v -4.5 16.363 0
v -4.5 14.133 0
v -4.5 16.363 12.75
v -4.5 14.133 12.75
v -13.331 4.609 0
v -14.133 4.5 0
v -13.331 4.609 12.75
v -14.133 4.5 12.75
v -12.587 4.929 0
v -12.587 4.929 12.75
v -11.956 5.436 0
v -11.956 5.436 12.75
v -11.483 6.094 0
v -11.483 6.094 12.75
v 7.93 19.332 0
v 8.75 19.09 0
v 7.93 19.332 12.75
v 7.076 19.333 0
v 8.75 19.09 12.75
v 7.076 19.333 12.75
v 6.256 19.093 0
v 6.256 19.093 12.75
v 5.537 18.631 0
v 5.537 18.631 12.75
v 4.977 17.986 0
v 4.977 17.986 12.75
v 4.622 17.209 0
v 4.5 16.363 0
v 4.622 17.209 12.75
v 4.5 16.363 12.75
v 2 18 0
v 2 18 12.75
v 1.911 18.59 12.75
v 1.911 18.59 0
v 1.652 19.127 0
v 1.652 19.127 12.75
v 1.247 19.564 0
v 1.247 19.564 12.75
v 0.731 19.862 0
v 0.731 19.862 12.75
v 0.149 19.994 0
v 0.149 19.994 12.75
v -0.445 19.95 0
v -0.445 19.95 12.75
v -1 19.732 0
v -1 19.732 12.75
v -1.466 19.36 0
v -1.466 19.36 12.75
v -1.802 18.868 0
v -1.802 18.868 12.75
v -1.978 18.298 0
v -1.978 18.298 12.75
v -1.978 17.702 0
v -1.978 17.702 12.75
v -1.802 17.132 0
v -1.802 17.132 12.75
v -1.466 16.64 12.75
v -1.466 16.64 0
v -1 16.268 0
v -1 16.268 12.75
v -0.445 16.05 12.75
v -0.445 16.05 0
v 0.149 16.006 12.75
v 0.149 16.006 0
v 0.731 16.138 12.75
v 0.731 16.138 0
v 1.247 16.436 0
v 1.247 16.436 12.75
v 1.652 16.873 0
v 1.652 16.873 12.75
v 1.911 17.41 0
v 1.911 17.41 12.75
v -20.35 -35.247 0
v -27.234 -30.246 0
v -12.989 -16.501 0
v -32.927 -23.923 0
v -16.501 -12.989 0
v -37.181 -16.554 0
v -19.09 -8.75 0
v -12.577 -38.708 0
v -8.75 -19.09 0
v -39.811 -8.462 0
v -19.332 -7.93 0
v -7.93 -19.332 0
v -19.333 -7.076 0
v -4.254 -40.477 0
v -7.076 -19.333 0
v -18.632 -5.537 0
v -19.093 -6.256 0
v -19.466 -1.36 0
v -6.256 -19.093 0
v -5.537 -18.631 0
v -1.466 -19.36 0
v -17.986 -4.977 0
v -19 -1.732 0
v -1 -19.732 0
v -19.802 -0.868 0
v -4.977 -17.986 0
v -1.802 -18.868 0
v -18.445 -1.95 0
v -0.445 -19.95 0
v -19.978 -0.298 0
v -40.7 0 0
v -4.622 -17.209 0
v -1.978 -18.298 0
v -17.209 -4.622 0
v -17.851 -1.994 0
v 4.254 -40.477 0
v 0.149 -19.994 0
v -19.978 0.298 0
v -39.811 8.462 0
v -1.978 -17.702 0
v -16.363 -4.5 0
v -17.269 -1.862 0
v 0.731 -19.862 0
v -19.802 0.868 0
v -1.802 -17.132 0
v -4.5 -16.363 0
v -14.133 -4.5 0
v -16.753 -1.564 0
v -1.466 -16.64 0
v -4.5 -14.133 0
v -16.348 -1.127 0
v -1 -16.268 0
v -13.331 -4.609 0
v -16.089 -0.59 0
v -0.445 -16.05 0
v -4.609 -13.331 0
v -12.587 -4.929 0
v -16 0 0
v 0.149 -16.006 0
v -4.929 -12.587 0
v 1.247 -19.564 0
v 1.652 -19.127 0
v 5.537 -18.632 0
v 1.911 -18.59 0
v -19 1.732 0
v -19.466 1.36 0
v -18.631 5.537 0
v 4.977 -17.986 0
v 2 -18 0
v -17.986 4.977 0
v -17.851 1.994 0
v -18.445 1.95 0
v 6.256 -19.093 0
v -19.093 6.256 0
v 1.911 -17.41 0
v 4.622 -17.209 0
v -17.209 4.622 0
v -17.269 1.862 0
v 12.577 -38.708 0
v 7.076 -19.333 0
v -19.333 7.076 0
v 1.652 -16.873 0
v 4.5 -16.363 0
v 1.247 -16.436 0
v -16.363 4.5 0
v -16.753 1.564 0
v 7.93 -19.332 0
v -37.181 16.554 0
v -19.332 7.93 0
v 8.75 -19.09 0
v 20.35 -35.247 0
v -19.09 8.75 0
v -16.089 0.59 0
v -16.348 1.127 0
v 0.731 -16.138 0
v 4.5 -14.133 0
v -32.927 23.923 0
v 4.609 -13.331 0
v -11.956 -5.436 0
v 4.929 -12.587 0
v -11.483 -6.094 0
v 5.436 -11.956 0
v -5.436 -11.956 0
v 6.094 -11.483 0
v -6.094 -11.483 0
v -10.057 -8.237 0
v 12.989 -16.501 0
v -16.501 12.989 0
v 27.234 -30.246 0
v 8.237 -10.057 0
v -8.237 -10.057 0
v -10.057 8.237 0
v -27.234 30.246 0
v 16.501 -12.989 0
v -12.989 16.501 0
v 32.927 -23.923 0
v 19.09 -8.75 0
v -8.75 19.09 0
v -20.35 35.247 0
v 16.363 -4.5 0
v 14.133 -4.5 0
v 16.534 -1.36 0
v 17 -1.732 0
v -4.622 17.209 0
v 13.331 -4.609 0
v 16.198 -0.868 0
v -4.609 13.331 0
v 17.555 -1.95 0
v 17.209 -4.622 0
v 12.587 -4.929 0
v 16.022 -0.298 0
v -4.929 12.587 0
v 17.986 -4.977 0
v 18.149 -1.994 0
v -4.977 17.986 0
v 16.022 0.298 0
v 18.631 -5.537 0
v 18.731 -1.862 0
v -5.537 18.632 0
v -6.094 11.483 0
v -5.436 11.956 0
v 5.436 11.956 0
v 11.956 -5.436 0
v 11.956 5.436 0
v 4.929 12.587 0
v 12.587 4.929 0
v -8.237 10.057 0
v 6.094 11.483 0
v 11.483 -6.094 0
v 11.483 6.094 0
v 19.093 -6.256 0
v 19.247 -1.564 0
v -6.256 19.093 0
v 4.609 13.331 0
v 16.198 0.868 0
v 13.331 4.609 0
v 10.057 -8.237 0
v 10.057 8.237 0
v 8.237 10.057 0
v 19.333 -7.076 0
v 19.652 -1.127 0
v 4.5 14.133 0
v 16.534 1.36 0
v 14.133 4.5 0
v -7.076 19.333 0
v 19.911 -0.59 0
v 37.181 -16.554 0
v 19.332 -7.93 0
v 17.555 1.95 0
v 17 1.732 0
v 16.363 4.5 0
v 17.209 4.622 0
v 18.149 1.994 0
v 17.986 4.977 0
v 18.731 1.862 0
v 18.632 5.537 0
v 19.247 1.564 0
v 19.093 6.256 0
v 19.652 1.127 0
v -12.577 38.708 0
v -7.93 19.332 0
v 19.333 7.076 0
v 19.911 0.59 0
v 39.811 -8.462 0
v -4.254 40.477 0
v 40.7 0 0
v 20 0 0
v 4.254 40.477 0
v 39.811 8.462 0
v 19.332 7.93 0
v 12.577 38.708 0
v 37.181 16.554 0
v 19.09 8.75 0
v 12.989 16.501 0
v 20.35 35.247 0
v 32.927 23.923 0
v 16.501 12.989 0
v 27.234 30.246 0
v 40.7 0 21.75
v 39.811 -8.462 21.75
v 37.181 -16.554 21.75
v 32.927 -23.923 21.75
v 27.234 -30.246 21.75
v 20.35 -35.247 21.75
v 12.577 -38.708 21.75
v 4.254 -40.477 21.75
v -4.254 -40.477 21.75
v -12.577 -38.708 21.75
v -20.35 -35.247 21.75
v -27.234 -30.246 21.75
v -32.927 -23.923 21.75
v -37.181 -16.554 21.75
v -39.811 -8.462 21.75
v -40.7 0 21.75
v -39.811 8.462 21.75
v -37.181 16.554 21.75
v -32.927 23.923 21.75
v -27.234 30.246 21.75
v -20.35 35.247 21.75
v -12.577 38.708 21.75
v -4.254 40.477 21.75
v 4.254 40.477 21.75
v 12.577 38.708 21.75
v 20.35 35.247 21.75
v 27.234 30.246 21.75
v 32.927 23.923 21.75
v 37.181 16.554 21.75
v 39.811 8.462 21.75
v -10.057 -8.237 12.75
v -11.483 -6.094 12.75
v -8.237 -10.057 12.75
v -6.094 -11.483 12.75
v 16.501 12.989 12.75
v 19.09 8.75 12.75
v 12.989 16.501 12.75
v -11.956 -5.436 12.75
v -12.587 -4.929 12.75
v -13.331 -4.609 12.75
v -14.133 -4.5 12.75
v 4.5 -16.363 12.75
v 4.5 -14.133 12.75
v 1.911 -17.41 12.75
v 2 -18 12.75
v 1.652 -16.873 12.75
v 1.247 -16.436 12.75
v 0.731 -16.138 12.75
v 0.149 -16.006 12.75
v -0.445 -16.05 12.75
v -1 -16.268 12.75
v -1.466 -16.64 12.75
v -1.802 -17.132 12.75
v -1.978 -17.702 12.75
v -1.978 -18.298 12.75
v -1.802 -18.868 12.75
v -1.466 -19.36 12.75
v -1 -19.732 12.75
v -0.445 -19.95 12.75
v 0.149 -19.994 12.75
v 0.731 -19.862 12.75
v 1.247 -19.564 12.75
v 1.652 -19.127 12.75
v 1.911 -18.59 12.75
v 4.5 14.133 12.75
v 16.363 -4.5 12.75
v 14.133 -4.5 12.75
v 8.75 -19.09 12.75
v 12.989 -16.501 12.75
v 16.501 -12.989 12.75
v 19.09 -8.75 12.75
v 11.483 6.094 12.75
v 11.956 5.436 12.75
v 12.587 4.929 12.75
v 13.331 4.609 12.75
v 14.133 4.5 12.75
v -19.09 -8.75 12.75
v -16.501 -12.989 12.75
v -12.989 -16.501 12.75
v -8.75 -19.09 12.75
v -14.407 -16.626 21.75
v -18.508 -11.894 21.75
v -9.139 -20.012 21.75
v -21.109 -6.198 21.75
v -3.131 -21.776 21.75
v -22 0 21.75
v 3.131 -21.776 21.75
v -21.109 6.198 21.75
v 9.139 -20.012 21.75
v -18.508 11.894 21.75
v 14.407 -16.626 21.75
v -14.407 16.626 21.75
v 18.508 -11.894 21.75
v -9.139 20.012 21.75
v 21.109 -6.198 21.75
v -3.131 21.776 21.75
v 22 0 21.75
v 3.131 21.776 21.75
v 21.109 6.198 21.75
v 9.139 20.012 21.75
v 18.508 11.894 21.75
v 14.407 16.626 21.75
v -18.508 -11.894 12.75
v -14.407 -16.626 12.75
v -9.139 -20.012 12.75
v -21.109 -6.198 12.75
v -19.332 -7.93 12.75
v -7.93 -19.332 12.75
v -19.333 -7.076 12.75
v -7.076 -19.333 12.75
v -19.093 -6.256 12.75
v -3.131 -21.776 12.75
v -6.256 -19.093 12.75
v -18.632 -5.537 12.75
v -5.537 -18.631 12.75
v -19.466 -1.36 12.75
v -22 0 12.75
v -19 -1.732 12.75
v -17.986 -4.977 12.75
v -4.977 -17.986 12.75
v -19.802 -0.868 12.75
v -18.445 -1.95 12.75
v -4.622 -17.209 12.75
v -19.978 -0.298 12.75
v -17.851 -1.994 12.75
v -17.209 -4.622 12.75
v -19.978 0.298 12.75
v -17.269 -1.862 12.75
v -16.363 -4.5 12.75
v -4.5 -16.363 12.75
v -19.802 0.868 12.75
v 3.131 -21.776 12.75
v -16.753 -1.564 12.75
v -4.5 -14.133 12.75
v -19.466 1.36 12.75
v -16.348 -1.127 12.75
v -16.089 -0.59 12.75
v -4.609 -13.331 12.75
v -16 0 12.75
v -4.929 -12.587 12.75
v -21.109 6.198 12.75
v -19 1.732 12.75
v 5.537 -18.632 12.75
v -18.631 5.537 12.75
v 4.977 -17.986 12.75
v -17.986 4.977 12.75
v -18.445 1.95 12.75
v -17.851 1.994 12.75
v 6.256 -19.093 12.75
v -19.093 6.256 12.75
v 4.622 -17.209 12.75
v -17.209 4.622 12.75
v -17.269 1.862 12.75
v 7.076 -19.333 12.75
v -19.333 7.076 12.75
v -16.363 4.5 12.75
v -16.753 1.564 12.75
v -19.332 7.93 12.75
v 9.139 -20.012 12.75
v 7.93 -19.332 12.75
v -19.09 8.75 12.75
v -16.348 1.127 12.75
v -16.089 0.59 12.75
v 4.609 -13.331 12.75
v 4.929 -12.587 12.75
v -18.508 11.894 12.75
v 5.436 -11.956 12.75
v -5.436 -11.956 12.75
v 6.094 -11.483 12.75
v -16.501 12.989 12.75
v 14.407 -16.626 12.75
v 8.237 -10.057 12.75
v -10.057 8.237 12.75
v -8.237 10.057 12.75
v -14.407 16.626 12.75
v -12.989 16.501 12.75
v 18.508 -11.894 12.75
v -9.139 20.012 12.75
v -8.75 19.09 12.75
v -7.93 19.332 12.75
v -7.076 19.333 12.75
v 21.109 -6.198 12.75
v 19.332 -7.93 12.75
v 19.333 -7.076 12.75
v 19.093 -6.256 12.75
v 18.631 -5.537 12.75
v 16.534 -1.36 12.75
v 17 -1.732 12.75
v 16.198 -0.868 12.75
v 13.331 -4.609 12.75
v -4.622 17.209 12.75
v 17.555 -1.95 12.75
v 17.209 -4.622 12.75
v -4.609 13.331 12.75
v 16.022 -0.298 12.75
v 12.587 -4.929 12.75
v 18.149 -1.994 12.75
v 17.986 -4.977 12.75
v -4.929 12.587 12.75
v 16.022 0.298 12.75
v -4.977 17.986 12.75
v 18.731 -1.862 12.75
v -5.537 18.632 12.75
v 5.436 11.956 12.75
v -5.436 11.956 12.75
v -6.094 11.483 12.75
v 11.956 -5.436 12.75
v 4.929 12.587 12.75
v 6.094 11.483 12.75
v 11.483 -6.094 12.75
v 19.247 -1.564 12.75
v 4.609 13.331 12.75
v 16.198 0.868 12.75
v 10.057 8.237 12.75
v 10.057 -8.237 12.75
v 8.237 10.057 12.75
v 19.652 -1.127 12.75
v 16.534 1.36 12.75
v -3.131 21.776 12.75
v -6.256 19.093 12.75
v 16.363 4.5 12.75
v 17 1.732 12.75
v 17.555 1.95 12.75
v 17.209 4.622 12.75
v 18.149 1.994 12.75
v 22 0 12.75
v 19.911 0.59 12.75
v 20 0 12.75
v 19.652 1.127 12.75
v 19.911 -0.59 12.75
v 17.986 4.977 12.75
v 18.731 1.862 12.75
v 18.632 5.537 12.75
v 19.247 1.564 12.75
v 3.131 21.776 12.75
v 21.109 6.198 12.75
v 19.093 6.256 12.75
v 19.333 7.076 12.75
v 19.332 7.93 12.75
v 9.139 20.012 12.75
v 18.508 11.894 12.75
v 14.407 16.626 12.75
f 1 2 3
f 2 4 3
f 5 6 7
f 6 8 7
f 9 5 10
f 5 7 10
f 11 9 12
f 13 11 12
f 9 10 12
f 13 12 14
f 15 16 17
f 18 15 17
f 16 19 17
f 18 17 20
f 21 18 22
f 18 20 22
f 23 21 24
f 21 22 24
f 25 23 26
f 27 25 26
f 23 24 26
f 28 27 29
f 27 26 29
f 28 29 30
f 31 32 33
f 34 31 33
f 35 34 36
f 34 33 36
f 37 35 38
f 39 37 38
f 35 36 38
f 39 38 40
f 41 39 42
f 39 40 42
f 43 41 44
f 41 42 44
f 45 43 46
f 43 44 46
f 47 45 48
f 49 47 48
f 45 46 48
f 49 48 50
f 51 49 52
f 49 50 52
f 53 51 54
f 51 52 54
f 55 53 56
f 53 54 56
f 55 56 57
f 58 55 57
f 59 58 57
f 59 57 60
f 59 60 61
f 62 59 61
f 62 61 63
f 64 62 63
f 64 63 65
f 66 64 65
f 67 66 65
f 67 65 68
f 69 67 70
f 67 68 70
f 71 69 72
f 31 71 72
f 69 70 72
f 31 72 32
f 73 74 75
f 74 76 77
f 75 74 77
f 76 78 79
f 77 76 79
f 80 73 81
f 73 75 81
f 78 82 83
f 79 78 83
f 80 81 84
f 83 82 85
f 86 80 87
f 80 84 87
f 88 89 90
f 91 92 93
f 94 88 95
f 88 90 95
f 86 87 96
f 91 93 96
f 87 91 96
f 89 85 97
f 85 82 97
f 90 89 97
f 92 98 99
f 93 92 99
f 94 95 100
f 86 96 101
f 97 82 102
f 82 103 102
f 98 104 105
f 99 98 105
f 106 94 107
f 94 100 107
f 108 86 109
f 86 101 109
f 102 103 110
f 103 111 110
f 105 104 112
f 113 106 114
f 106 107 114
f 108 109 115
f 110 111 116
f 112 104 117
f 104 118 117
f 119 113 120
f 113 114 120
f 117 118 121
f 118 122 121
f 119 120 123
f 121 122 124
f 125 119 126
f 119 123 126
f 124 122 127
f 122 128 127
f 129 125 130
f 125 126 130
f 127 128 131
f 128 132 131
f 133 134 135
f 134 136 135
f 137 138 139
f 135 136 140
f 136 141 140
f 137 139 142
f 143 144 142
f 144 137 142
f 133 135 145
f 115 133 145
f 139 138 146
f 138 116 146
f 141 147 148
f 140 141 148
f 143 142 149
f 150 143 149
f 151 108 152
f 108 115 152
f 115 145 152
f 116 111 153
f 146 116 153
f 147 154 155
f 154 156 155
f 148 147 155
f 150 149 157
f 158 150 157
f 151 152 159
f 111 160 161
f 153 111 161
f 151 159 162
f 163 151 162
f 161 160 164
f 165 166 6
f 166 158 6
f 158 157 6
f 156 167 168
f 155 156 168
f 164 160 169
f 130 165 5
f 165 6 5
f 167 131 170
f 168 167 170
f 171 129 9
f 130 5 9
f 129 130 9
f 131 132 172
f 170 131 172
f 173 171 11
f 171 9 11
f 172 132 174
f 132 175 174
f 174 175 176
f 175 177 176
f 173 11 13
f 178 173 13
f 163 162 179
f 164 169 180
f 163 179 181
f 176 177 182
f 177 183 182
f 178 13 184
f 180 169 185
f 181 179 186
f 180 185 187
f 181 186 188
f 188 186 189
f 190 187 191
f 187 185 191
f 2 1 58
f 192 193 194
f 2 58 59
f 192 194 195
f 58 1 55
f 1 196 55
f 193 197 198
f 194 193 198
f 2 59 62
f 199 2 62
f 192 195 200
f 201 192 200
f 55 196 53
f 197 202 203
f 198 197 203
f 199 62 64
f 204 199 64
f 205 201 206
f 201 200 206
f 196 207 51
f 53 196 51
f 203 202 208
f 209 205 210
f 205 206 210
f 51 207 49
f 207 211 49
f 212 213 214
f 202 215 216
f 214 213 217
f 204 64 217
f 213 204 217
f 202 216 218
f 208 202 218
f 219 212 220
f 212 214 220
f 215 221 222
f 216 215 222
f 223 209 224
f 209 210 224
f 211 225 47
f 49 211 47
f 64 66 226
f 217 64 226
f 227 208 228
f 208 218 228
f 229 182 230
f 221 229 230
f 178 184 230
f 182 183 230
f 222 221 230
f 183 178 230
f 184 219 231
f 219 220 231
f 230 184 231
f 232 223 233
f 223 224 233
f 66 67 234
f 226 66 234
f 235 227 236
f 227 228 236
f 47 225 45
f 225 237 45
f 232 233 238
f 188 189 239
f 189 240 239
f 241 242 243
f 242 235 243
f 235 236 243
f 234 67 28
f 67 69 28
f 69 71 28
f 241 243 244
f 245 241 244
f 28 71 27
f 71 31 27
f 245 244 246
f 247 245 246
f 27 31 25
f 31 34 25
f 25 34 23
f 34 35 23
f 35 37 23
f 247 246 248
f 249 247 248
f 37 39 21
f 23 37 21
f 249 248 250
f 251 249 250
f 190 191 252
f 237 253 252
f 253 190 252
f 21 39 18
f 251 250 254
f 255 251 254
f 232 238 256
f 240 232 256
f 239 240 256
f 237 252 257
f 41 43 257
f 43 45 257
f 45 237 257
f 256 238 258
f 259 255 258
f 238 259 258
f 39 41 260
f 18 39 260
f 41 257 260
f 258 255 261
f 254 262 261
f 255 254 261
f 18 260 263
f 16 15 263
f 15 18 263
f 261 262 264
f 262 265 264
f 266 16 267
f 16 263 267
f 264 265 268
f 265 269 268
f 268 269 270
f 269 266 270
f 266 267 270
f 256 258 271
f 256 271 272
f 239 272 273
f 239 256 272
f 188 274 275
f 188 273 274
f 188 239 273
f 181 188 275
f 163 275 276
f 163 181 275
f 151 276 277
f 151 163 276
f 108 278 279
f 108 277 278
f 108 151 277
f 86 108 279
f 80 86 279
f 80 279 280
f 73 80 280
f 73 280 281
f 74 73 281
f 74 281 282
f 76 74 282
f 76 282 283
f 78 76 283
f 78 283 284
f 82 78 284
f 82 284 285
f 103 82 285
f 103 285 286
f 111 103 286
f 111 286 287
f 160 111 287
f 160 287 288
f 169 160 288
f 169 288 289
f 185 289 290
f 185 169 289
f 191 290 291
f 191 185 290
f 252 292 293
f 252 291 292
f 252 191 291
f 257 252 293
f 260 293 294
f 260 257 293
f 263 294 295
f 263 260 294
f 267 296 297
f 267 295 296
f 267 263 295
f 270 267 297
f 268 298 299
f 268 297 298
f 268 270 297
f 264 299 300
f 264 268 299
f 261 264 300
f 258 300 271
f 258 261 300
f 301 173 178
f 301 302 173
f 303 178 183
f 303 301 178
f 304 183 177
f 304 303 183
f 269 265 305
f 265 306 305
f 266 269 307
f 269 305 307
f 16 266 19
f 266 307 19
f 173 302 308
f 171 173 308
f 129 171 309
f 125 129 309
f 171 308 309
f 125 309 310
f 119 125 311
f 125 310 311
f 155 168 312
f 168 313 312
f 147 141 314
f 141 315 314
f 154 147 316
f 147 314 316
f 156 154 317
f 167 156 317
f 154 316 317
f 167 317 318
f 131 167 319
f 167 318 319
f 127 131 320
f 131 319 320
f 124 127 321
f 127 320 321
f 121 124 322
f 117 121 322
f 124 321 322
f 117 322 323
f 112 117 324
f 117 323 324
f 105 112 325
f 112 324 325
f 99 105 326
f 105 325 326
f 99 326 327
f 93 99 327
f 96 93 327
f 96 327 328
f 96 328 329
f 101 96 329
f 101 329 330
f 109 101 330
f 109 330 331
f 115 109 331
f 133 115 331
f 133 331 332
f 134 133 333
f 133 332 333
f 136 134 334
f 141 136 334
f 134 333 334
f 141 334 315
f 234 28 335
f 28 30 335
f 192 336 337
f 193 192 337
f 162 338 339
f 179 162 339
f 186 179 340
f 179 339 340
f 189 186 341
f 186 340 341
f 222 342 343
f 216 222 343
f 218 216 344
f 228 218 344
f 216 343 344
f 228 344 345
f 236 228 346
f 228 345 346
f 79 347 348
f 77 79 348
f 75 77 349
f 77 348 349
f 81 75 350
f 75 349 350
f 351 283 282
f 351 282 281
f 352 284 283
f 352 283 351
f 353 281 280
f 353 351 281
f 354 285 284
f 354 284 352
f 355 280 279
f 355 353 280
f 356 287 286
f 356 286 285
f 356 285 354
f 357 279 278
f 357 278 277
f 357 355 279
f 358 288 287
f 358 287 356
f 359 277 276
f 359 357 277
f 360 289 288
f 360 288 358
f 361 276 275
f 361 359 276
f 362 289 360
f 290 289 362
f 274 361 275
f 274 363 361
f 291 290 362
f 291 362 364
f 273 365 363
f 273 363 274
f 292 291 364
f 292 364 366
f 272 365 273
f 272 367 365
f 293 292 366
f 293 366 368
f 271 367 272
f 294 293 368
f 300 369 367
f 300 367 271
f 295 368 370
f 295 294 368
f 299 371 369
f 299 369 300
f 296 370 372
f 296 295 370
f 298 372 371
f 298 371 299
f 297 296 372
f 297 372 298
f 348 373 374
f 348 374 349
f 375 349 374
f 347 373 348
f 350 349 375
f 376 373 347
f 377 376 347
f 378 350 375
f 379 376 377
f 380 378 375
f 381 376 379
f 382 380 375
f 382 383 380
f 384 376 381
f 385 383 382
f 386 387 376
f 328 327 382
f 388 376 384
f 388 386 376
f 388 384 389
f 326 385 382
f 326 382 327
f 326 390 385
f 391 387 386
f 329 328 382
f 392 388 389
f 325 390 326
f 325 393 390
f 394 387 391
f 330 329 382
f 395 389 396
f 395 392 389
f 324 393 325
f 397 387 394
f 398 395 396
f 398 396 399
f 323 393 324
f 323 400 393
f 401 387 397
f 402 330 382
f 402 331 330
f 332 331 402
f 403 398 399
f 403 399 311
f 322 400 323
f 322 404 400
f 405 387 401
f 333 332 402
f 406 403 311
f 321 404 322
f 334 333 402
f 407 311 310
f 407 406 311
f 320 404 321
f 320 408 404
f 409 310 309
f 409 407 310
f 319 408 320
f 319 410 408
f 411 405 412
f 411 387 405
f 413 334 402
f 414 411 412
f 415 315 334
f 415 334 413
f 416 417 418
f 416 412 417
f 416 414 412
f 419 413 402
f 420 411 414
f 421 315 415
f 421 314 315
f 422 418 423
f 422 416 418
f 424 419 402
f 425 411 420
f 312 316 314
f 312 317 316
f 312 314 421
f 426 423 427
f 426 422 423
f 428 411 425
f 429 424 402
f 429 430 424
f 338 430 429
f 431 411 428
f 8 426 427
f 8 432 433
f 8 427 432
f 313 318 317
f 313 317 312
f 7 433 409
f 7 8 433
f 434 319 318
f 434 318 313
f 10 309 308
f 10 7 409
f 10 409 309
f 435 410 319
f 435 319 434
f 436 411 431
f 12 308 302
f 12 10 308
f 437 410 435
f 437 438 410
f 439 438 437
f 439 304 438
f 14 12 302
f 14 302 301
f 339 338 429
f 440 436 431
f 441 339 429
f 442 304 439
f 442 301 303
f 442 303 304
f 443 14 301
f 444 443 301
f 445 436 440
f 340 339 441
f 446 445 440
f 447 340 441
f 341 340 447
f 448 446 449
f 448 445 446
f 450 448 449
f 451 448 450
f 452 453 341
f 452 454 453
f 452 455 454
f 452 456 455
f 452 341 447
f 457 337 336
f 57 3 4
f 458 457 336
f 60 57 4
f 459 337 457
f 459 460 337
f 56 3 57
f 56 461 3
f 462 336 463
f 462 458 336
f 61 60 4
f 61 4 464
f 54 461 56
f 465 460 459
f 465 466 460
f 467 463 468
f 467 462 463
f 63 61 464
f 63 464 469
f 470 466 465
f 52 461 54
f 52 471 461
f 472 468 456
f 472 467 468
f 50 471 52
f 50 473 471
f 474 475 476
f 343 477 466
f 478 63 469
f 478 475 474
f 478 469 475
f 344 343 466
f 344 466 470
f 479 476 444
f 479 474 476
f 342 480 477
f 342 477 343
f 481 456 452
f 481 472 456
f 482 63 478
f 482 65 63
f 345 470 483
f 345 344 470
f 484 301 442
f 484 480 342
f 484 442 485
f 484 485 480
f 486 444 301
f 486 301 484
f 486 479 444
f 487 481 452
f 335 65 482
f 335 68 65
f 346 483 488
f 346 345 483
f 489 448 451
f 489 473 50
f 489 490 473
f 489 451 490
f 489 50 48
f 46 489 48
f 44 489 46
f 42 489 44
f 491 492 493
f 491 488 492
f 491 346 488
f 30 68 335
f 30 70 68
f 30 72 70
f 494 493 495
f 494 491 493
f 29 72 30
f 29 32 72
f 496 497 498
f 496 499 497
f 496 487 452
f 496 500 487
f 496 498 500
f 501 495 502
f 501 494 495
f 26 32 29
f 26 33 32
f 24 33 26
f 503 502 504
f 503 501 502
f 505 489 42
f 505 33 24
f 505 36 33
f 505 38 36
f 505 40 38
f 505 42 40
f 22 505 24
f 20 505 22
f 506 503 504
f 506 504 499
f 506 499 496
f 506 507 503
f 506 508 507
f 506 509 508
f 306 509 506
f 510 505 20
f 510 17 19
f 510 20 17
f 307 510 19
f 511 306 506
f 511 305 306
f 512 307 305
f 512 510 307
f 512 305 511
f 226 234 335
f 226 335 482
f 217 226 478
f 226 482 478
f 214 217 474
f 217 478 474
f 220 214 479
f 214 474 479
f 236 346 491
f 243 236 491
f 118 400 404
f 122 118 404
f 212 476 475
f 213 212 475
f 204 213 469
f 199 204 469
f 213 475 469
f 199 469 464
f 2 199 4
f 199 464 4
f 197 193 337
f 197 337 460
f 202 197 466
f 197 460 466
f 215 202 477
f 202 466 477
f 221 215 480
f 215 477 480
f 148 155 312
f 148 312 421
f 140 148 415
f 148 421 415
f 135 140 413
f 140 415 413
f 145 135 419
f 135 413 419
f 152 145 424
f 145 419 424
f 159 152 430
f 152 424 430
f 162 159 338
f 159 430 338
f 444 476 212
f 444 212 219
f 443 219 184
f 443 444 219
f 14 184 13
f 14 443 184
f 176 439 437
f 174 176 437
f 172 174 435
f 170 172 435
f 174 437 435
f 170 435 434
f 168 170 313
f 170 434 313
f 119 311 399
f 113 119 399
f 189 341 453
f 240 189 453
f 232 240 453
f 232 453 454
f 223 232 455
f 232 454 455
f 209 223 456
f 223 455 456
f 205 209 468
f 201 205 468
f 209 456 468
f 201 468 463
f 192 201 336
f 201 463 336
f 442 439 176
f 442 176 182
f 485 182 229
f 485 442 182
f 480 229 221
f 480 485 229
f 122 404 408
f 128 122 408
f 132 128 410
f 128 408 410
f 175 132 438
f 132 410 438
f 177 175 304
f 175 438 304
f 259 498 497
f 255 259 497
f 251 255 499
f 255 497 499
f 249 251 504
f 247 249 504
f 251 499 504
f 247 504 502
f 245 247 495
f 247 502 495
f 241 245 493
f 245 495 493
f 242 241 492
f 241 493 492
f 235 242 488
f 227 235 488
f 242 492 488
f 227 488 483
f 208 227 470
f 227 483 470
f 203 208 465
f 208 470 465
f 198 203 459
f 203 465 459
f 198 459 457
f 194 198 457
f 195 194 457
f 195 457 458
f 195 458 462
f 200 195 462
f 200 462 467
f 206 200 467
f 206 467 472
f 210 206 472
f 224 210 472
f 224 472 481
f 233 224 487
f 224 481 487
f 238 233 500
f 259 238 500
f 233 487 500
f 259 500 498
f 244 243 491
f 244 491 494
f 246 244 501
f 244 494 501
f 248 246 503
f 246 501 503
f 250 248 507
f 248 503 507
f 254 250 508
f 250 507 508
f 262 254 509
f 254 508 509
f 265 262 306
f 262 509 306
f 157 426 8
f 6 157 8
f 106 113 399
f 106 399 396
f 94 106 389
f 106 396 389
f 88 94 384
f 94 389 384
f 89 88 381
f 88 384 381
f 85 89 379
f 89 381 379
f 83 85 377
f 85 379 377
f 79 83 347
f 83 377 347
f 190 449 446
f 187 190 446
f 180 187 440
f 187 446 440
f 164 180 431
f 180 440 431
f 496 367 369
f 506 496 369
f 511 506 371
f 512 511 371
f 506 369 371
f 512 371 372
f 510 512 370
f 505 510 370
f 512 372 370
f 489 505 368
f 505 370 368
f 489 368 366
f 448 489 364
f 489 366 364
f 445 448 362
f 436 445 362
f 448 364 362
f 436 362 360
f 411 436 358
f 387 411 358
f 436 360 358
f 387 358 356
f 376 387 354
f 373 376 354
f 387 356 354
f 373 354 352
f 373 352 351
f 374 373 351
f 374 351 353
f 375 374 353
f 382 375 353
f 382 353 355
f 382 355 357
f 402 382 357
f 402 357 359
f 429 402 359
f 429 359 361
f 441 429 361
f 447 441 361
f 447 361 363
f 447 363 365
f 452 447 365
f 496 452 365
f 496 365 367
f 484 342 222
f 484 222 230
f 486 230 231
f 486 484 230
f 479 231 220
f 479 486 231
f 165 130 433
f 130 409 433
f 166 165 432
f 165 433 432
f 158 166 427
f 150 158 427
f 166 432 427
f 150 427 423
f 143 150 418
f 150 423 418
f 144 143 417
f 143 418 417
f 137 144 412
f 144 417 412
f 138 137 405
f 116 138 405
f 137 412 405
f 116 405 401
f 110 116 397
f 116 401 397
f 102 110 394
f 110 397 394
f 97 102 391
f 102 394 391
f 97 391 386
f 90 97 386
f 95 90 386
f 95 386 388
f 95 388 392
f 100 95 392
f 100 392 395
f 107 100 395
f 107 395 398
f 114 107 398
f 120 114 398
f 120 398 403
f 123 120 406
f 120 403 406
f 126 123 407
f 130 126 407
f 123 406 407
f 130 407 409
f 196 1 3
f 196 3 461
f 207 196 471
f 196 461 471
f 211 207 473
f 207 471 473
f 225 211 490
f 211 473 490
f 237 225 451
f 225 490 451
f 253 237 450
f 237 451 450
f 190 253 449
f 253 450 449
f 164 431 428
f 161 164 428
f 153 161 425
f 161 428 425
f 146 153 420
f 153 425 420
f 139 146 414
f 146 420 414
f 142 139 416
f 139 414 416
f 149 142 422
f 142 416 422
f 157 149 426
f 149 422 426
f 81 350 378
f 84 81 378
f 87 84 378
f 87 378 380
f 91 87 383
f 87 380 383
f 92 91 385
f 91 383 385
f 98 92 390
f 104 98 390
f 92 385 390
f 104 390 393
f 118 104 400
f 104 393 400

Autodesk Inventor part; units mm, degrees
sketch "Sketch1" plane through (0, 0, 0) normal (0, 0, 1) x (1, 0, 0)
  circle A0 centre (0, 0) radius 40.7
  dimension "d0" = 81.4
extrude "Extrusion1" add sketch "Sketch1" along normal blind 21.75
sketch "Sketch2" plane through (0, 0, 21.75) normal (0, 0, 1) x (1, 0, 0)
  circle A0 centre (0, 0) radius 22
  dimension "d3" = 44
extrude "Extrusion2" cut sketch "Sketch2" against normal blind 9
sketch "Sketch3" plane through (0, 0, 12.75) normal (0, 0, 1) x (1, 0, 0)
  circle A0 centre (0, 18) radius 2
  circle A1 centre (-18, 0) radius 2
  circle A2 centre (0, -18) radius 2
  circle A3 centre (18, 0) radius 2
  point P0 (0, 0)
  dimension "d6" = 4
  dimension "d7" = 18
  dimension "d10" = 360
extrude "Extrusion3" cut sketch "Sketch3" against normal blind 12.75
sketch "Sketch4" plane through (0, 0, 12.75) normal (0, 0, 1) x (1, 0, 0)
  arc A0 (-4.5165, 17.448) -> (-8.8542, 19.2414) centre (-7.5165, 16.3345) ccw
  arc A1 (-8.8542, 19.2414) -> (-19.0977, 9.16) centre (0, 0) ccw
  arc A2 (-14.1333, 4.5) -> (-11.4833, 6.0938) centre (-14.1333, 7.5) ccw
  line L0 (-4.5, 14.1333) -> (-4.5, 16.3631)
  arc A3 (-4.5, 16.3631) -> (-8.75, 19.0902) centre (-7.5, 16.3631) ccw
  arc A4 (-6.0938, 11.4833) -> (-4.5, 14.1333) centre (-7.5, 14.1333) ccw
  arc A5 (-6.0938, 11.4833) -> (-11.4833, 6.0938) centre (0, 0) ccw
  arc A6 (-8.8542, 19.2414) -> (-19.2547, 8.8254) centre (0, 0) ccw
  arc A7 (-8.75, 19.0902) -> (-19.0902, 8.75) centre (0, 0) ccw
  arc A8 (-19.0902, 8.75) -> (-16.3631, 4.5) centre (-16.3631, 7.5) ccw
  line L1 (-16.3631, 4.5) -> (-14.1333, 4.5)
  arc A9 (-11.4833, -6.0938) -> (-14.1333, -4.5) centre (-14.1333, -7.5) ccw
  arc A10 (-4.5, -14.1333) -> (-6.0938, -11.4833) centre (-7.5, -14.1333) ccw
  arc A11 (-11.4833, -6.0938) -> (-6.0938, -11.4833) centre (0, 0) ccw
  line L2 (-14.1333, -4.5) -> (-16.3631, -4.5)
  line L3 (-4.5, -16.3631) -> (-4.5, -14.1333)
  arc A12 (-16.3631, -4.5) -> (-19.0902, -8.75) centre (-16.3631, -7.5) ccw
  arc A13 (-17.448, -4.5165) -> (-19.2414, -8.8542) centre (-16.3345, -7.5165) ccw
  arc A14 (-8.75, -19.0902) -> (-4.5, -16.3631) centre (-7.5, -16.3631) ccw
  arc A15 (-19.0902, -8.75) -> (-8.75, -19.0902) centre (0, 0) ccw
  arc A16 (-19.2414, -8.8542) -> (-9.16, -19.0977) centre (0, 0) ccw
  arc A17 (-19.2414, -8.8542) -> (-8.8254, -19.2547) centre (0, 0) ccw
  arc A18 (6.0938, -11.4833) -> (4.5, -14.1333) centre (7.5, -14.1333) ccw
  arc A19 (14.1333, -4.5) -> (11.4833, -6.0938) centre (14.1333, -7.5) ccw
  arc A20 (6.0938, -11.4833) -> (11.4833, -6.0938) centre (0, 0) ccw
  line L4 (4.5, -14.1333) -> (4.5, -16.3631)
  line L5 (16.3631, -4.5) -> (14.1333, -4.5)
  arc A21 (4.5, -16.3631) -> (8.75, -19.0902) centre (7.5, -16.3631) ccw
  arc A22 (4.5165, -17.448) -> (8.8542, -19.2414) centre (7.5165, -16.3345) ccw
  arc A23 (19.0902, -8.75) -> (16.3631, -4.5) centre (16.3631, -7.5) ccw
  arc A24 (8.75, -19.0902) -> (19.0902, -8.75) centre (0, 0) ccw
  arc A25 (8.8542, -19.2414) -> (19.0977, -9.16) centre (0, 0) ccw
  arc A26 (8.8542, -19.2414) -> (19.2547, -8.8254) centre (0, 0) ccw
  arc A27 (11.4833, 6.0938) -> (14.1333, 4.5) centre (14.1333, 7.5) ccw
  arc A28 (4.5, 14.1333) -> (6.0938, 11.4833) centre (7.5, 14.1333) ccw
  arc A29 (11.4833, 6.0938) -> (6.0938, 11.4833) centre (0, 0) ccw
  line L6 (14.1333, 4.5) -> (16.3631, 4.5)
  line L7 (4.5, 16.3631) -> (4.5, 14.1333)
  arc A30 (16.3631, 4.5) -> (19.0902, 8.75) centre (16.3631, 7.5) ccw
  arc A31 (17.448, 4.5165) -> (19.2414, 8.8542) centre (16.3345, 7.5165) ccw
  arc A32 (8.75, 19.0902) -> (4.5, 16.3631) centre (7.5, 16.3631) ccw
  arc A33 (19.0902, 8.75) -> (8.75, 19.0902) centre (0, 0) ccw
  arc A34 (19.2414, 8.8542) -> (9.16, 19.0977) centre (0, 0) ccw
  arc A35 (19.2414, 8.8542) -> (8.8254, 19.2547) centre (0, 0) ccw
  point P0 (41.0732, 32.7294)
  point P1 (-17.4931, 4.4714)
  point P2 (-16.3796, 7.4714)
  point P3 (-7.4714, -16.3796)
  point P4 (-4.4714, -17.4931)
  point P5 (16.3796, -7.4714)
  point P6 (17.4931, -4.4714)
  point P7 (7.4714, 16.3796)
  point P8 (4.4714, 17.4931)
  dimension "d16" = 360
extrude "Extrusion4" cut sketch "Sketch4" against normal blind 12.75
ref_plane "Work Plane1" through (40.7, 0, 0) normal (1, 0, 0) x (0, 1, 0)
properties part number "MotorHousing" material "Plastic, Opaque White"
